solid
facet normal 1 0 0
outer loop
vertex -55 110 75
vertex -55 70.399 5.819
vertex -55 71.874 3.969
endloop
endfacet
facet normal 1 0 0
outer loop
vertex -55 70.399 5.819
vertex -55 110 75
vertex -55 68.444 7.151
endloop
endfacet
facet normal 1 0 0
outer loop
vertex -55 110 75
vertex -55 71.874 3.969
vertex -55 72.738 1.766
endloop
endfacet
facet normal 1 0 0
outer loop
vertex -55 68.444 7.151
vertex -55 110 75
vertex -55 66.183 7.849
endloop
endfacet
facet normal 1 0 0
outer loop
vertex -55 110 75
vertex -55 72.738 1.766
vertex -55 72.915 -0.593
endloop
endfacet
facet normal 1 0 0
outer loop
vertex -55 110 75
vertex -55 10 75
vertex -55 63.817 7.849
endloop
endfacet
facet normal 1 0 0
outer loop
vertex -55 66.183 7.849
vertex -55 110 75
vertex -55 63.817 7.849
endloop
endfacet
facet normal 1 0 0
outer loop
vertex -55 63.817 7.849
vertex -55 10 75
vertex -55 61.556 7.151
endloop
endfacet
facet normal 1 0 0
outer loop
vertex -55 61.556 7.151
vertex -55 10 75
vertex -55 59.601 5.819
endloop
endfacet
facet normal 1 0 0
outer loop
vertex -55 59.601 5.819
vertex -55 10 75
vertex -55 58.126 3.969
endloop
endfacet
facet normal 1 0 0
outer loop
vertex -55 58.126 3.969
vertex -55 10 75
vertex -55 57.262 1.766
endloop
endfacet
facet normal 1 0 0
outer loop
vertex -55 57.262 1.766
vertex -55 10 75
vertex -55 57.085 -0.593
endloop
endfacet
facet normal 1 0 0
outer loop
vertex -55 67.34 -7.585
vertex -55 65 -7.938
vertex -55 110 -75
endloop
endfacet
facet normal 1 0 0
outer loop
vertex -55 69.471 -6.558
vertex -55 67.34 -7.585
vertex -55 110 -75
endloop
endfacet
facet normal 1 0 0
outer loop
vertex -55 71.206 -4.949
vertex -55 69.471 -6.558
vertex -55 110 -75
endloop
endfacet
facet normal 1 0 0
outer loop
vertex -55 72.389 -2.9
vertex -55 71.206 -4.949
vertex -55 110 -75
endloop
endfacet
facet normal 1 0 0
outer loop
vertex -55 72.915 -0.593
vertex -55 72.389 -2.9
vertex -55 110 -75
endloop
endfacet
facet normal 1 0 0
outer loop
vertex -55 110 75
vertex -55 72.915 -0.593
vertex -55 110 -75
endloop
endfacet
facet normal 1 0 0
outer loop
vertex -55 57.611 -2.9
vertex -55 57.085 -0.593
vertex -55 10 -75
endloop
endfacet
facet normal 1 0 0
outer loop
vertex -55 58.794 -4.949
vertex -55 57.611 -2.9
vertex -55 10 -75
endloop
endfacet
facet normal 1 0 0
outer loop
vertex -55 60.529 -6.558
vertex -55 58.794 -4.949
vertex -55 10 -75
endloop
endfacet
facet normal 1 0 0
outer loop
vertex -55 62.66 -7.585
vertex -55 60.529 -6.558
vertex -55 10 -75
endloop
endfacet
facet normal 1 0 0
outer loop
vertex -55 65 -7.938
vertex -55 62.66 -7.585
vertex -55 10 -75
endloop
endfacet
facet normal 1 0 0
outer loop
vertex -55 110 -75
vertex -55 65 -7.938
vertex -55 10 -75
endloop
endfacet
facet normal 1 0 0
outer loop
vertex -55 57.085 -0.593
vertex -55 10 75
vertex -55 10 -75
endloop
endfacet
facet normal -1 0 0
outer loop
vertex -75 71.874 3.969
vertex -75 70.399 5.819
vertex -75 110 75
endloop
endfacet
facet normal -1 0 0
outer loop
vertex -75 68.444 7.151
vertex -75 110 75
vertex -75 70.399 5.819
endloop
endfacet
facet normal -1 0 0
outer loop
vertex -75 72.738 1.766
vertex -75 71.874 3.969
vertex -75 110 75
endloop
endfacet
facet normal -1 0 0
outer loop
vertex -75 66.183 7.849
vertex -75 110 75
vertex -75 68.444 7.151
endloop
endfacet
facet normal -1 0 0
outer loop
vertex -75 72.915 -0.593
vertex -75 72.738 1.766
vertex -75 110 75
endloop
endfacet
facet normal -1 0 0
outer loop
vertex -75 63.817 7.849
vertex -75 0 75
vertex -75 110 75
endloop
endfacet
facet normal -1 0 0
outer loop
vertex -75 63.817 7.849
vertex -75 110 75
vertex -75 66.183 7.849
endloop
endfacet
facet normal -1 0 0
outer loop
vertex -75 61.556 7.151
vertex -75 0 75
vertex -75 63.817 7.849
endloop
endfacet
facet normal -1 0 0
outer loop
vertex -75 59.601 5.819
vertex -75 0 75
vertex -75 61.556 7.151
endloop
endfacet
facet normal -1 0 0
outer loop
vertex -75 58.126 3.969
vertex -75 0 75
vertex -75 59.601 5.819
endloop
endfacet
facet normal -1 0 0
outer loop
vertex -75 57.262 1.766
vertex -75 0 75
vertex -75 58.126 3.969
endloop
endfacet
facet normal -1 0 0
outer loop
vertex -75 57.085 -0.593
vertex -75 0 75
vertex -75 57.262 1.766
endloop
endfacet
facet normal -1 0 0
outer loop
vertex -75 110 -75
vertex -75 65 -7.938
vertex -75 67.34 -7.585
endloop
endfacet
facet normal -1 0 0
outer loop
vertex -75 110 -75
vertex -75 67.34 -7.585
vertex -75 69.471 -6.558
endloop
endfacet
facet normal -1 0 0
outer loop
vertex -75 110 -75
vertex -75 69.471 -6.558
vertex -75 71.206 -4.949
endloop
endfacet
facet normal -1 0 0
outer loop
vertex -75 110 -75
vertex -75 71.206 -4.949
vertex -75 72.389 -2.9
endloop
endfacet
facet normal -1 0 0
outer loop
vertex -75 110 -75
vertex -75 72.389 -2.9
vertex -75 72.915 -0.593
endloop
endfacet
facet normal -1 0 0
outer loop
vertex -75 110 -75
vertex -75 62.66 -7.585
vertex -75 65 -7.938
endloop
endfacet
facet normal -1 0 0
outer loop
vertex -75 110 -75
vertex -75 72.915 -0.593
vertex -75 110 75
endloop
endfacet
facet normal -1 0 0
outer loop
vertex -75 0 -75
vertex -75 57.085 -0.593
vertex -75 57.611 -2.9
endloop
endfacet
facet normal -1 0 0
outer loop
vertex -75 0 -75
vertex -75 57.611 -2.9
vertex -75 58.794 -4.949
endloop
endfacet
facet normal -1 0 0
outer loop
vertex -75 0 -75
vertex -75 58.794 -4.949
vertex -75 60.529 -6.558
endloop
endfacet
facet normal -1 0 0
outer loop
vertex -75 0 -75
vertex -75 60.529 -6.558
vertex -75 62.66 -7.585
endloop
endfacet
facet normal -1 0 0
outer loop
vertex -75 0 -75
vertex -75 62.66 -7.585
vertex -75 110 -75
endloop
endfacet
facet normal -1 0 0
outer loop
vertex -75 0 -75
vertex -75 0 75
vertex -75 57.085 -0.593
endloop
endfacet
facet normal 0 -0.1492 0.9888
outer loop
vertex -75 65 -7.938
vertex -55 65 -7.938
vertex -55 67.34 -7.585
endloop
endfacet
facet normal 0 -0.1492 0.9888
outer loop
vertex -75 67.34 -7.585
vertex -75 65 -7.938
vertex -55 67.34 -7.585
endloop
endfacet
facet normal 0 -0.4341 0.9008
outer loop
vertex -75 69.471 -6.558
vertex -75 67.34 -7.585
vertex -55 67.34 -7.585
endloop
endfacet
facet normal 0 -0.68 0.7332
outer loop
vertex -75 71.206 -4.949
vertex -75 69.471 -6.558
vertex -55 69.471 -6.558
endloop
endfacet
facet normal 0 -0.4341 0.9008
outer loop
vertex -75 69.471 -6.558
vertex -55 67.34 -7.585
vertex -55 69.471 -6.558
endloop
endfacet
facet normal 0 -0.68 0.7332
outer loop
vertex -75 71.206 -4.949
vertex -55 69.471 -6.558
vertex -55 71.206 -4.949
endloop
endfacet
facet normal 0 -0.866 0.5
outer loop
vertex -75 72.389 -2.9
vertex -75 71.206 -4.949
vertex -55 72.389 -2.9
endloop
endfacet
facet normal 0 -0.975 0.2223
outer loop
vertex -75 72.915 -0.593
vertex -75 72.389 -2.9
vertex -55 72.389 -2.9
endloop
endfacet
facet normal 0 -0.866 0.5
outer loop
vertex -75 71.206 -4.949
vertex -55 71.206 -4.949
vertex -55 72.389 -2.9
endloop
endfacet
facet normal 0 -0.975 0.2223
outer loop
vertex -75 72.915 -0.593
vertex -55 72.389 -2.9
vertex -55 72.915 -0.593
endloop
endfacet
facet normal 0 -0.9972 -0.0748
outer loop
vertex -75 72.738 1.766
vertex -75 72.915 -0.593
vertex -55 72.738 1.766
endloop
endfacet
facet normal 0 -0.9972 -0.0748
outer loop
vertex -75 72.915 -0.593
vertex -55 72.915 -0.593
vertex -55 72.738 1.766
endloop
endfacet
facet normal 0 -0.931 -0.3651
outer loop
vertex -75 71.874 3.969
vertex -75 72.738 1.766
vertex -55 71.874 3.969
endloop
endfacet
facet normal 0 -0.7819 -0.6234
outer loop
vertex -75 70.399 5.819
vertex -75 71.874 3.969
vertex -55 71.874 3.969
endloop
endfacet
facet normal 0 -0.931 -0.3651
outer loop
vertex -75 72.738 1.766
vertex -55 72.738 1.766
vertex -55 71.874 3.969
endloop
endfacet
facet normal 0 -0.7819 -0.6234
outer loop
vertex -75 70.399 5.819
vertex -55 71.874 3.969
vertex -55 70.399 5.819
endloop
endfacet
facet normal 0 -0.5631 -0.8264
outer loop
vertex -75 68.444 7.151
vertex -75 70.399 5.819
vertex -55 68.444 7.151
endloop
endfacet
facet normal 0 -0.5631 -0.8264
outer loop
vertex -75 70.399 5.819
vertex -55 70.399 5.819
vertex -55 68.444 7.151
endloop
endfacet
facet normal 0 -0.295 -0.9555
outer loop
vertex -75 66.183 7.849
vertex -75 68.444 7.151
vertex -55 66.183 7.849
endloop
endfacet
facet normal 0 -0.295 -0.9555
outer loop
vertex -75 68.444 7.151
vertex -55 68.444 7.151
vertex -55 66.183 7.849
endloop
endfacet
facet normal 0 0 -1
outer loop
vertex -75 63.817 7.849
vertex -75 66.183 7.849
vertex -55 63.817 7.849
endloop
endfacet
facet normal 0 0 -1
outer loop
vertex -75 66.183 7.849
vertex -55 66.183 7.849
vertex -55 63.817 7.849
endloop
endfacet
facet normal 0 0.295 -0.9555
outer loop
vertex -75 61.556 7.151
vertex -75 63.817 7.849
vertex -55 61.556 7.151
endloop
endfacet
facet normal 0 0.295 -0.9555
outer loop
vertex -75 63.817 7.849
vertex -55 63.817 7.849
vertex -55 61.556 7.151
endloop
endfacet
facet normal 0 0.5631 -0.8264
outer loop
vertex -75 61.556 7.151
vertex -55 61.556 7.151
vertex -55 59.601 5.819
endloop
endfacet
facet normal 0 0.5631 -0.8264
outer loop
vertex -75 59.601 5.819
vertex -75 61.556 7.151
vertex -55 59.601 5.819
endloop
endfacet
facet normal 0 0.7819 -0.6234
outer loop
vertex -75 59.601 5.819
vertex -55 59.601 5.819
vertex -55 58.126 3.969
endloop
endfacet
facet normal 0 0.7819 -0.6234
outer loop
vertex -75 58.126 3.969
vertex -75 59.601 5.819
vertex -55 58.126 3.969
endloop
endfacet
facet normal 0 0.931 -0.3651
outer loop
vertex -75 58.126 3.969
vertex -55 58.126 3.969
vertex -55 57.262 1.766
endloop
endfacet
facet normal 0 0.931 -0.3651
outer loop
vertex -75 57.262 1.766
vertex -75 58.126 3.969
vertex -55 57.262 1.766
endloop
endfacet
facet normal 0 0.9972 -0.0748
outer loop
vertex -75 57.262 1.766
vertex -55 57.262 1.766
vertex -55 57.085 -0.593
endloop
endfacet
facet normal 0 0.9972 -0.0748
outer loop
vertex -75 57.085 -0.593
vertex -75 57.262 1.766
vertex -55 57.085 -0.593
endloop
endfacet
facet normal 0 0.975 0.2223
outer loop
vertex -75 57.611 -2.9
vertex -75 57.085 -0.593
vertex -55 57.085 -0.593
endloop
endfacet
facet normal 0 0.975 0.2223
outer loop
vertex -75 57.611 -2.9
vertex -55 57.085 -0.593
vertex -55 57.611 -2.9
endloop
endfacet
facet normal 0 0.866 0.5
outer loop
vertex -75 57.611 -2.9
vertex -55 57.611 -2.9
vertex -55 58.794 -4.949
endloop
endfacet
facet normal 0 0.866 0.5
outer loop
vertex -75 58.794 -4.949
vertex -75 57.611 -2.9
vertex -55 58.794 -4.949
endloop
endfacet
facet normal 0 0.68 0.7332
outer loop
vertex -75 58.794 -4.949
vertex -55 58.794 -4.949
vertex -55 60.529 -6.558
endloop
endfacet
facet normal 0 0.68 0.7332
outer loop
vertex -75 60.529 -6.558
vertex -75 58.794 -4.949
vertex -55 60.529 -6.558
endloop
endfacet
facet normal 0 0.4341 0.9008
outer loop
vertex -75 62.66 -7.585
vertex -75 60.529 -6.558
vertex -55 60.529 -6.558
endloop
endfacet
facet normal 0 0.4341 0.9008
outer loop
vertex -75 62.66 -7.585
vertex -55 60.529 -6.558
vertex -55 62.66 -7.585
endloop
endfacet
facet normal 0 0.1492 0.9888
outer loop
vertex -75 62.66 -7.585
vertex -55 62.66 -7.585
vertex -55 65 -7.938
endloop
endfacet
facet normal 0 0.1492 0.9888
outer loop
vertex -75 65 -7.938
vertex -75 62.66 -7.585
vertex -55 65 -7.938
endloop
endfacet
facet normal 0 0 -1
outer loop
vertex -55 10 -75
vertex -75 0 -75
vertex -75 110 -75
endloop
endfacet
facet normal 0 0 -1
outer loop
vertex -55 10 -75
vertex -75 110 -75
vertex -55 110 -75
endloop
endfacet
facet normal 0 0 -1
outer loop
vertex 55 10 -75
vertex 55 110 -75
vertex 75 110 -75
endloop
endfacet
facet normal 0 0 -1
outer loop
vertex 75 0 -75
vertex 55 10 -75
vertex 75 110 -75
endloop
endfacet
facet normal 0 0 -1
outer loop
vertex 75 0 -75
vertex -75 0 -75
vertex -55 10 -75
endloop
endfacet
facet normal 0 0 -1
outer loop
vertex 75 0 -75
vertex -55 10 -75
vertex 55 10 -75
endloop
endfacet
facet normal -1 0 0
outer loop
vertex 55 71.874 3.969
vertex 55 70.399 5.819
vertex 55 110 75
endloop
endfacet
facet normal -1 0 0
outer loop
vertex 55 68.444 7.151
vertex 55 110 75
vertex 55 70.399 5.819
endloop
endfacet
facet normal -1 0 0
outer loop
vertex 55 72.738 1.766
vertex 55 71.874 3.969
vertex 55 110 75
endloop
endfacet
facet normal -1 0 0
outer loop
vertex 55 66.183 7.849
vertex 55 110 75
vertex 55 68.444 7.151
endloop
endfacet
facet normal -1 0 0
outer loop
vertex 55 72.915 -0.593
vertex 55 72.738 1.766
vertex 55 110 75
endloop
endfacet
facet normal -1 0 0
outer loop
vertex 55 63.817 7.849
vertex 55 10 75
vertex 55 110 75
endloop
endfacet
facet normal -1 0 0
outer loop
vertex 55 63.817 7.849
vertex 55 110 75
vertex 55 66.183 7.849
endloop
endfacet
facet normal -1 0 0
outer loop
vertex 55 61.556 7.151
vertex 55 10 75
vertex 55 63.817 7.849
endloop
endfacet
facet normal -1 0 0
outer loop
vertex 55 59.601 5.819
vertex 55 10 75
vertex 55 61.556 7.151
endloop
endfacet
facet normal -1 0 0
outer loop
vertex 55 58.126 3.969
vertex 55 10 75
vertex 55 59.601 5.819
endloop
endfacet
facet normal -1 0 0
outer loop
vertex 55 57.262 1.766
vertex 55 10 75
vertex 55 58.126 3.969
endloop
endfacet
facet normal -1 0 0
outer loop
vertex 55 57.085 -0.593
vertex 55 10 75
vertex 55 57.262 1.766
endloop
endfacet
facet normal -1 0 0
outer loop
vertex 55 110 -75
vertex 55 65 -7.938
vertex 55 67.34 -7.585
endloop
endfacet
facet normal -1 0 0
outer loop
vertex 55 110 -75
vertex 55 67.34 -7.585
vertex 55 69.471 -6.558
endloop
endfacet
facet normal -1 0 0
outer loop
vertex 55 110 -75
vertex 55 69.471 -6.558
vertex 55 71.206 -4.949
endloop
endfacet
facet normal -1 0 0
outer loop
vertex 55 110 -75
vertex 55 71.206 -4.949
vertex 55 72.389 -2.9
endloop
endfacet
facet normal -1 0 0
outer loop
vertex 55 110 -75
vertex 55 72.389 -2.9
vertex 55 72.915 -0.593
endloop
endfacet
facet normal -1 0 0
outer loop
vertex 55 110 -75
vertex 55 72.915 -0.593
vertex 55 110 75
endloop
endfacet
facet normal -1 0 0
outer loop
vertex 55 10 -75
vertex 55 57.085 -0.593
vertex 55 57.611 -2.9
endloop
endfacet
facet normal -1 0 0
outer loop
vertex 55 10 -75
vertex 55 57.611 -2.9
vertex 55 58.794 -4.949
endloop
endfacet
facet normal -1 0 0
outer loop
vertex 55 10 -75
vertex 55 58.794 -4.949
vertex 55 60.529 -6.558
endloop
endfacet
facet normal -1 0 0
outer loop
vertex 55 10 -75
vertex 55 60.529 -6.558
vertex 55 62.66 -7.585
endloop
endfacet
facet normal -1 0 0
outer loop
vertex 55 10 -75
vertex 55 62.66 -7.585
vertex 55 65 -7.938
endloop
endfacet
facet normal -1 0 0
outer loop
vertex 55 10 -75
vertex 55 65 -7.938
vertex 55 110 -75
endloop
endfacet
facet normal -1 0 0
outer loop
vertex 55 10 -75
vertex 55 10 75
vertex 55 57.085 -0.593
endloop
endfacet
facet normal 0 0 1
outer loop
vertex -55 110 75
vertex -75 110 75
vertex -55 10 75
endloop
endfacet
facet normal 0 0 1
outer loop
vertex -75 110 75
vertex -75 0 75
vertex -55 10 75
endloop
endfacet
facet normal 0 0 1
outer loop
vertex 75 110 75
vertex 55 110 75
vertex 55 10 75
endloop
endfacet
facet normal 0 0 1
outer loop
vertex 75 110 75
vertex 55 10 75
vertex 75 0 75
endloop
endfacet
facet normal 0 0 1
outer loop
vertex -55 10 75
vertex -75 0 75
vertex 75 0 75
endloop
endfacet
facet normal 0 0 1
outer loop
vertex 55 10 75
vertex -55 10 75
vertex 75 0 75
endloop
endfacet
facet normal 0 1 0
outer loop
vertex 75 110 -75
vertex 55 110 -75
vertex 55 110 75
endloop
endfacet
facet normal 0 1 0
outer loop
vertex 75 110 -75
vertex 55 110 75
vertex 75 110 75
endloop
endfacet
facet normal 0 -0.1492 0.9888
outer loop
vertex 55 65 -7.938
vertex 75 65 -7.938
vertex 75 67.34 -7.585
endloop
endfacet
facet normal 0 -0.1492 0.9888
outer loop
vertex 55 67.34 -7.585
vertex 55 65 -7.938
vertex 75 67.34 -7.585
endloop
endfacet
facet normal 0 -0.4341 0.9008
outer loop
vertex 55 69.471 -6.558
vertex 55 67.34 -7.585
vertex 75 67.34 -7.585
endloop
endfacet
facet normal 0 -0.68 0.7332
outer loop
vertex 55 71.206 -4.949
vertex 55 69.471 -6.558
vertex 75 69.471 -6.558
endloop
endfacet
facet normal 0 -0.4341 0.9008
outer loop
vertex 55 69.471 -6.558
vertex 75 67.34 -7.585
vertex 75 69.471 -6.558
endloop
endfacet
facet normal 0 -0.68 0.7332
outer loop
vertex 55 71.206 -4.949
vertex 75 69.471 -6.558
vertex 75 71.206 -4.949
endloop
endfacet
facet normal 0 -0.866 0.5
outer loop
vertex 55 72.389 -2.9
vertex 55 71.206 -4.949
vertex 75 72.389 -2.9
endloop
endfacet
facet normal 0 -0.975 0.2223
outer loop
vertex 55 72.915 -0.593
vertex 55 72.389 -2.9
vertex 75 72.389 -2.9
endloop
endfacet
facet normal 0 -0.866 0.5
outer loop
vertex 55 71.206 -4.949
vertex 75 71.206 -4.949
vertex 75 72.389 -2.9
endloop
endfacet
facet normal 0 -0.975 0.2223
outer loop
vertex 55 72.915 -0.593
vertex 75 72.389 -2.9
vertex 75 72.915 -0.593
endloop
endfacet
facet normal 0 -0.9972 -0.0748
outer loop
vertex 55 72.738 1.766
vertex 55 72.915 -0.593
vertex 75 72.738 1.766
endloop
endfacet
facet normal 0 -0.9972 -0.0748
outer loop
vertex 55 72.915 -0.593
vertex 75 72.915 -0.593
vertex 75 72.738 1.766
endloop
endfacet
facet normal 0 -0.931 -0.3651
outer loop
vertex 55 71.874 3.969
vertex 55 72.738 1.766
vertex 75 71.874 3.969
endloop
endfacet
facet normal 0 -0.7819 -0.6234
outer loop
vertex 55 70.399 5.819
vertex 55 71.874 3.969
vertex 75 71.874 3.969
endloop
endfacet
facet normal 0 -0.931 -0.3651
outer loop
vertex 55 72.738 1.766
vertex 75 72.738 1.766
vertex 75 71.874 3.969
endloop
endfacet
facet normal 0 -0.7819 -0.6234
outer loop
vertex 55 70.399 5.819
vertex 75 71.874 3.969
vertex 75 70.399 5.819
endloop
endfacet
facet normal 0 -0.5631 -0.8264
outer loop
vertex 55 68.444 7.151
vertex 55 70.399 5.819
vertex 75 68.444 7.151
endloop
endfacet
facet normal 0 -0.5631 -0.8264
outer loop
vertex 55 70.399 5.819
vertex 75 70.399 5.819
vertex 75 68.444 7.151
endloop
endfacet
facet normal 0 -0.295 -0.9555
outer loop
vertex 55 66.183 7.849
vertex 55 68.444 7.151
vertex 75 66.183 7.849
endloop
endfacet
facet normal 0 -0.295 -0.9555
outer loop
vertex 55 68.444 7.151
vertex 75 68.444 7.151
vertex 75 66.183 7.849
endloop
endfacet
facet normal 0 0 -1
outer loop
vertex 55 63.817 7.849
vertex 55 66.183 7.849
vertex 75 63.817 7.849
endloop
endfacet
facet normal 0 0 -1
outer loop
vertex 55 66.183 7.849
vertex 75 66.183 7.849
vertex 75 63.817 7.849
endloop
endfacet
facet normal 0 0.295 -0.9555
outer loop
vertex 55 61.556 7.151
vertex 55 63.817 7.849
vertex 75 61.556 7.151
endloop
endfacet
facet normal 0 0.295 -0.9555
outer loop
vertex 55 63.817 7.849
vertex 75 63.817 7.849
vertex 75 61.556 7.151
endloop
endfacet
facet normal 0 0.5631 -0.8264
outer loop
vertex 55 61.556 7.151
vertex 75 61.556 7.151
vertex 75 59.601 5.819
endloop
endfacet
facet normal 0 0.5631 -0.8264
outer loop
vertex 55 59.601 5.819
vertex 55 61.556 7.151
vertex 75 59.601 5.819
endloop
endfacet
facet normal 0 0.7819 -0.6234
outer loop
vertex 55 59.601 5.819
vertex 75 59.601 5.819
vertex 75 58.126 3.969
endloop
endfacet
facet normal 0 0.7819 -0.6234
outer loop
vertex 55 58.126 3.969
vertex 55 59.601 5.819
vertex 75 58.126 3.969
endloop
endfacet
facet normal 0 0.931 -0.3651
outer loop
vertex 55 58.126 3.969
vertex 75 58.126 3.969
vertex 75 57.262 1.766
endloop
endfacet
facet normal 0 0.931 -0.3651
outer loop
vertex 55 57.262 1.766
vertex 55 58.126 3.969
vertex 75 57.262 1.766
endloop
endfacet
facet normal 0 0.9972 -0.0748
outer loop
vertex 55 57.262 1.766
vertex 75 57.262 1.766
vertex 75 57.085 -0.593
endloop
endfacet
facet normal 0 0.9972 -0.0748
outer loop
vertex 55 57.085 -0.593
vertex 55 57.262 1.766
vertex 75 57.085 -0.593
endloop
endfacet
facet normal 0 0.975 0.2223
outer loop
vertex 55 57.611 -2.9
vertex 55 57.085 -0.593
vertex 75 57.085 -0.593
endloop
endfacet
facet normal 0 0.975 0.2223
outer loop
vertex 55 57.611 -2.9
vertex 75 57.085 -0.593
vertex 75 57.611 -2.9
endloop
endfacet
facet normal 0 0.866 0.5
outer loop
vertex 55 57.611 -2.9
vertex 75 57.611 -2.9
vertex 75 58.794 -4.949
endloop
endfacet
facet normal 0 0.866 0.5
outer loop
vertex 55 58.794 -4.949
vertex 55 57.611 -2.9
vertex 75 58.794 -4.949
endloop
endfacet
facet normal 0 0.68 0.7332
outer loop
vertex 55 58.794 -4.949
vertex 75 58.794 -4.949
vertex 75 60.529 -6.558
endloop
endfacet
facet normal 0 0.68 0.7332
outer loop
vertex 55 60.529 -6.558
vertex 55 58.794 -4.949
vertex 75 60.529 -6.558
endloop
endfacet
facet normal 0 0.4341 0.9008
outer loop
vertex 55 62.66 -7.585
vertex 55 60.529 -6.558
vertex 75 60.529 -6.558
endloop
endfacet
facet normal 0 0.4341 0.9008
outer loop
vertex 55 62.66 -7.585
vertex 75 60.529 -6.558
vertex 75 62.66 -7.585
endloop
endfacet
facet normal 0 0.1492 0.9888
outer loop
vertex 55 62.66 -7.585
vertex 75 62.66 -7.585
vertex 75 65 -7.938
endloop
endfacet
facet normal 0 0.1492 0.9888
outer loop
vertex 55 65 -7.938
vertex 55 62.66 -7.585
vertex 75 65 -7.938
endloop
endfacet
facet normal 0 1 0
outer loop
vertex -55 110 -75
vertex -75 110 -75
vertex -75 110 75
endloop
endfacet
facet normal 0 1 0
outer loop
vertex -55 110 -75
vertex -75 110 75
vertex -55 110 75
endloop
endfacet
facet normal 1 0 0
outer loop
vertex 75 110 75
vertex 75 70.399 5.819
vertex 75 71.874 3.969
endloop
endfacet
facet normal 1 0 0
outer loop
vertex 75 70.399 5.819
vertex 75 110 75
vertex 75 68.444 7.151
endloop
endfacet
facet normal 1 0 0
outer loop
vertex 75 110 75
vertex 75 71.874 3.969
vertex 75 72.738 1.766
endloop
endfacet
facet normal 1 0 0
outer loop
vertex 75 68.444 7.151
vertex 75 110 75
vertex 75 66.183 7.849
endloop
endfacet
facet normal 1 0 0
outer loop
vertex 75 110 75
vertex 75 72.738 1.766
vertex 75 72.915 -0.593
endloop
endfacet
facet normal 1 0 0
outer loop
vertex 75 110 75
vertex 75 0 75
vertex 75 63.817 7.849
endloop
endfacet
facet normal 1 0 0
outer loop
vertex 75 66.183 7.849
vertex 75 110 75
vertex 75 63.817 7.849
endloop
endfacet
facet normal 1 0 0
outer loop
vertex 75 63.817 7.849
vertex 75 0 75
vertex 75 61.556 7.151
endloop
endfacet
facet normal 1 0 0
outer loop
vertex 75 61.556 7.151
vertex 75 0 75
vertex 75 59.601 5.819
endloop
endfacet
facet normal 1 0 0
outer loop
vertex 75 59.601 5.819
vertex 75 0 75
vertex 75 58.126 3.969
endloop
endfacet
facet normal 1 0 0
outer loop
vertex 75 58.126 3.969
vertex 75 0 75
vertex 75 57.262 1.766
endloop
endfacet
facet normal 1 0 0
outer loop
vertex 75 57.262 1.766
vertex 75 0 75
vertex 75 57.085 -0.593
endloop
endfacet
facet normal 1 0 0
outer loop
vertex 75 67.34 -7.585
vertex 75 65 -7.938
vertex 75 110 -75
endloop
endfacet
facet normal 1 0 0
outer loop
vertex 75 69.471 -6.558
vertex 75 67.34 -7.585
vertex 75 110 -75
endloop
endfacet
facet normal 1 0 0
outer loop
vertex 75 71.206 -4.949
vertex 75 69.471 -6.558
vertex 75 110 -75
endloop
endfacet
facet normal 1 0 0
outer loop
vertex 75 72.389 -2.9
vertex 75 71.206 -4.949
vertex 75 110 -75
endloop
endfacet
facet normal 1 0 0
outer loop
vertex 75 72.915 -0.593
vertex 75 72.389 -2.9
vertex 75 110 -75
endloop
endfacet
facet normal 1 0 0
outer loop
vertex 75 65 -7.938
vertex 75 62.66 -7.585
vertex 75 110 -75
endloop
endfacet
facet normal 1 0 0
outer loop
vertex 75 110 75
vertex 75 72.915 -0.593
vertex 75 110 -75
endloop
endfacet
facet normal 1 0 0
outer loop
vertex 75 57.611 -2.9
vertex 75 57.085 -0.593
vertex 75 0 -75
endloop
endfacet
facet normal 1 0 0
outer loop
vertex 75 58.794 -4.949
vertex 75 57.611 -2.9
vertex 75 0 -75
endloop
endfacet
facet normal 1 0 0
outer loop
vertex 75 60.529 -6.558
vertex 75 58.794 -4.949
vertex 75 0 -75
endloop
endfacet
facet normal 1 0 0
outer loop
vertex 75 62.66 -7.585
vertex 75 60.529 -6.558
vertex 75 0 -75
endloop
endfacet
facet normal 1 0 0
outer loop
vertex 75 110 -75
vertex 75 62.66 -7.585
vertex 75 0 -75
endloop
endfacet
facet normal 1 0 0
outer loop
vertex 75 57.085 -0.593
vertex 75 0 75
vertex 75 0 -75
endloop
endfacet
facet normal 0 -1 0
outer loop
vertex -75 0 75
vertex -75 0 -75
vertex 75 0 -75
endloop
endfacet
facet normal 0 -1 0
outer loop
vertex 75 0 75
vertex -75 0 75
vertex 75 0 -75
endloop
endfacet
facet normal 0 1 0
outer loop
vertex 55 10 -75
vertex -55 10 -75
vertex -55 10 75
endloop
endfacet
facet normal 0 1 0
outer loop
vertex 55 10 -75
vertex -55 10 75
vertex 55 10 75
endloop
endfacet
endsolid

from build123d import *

# Parameters (mm, degrees)
SKETCH1_W           = 150
SKETCH1_H           = 150
BOSS_EXTRUDE1_DEPTH = 10
SKETCH2_W           = 20
SKETCH2_H           = 150
BOSS_EXTRUDE2_DEPTH = 100
SKETCH3_R           = 7.9375
CUT_EXTRUDE1_DEPTH  = 201.561711201


with BuildPart() as part:
    # Sketch1 → Boss-Extrude1 (new body)
    with BuildSketch(Plane(origin=(0, 0, 0), x_dir=(1, 0, 0), z_dir=(0, 1, 0))):
        Rectangle(SKETCH1_W, SKETCH1_H)
    extrude(amount=BOSS_EXTRUDE1_DEPTH)

    # Sketch2 → Boss-Extrude2 (add)
    with BuildSketch(Plane(origin=(0, 10, 0), x_dir=(1, 0, 0), z_dir=(0, 1, 0))):
        with Locations((-65, 0)):
            Rectangle(SKETCH2_W, SKETCH2_H)
        with Locations((65, 0)):
            Rectangle(SKETCH2_W, SKETCH2_H)
    extrude(amount=BOSS_EXTRUDE2_DEPTH)

    # Sketch3 → Cut-Extrude1 (cut, through all)
    with BuildSketch(Plane(origin=(75, 0, 0), x_dir=(0, 0, -1), z_dir=(1, 0, 0))):
        with Locations((0, 65)):
            Circle(SKETCH3_R)
    extrude(amount=-CUT_EXTRUDE1_DEPTH, mode=Mode.SUBTRACT)


solid = part.part
